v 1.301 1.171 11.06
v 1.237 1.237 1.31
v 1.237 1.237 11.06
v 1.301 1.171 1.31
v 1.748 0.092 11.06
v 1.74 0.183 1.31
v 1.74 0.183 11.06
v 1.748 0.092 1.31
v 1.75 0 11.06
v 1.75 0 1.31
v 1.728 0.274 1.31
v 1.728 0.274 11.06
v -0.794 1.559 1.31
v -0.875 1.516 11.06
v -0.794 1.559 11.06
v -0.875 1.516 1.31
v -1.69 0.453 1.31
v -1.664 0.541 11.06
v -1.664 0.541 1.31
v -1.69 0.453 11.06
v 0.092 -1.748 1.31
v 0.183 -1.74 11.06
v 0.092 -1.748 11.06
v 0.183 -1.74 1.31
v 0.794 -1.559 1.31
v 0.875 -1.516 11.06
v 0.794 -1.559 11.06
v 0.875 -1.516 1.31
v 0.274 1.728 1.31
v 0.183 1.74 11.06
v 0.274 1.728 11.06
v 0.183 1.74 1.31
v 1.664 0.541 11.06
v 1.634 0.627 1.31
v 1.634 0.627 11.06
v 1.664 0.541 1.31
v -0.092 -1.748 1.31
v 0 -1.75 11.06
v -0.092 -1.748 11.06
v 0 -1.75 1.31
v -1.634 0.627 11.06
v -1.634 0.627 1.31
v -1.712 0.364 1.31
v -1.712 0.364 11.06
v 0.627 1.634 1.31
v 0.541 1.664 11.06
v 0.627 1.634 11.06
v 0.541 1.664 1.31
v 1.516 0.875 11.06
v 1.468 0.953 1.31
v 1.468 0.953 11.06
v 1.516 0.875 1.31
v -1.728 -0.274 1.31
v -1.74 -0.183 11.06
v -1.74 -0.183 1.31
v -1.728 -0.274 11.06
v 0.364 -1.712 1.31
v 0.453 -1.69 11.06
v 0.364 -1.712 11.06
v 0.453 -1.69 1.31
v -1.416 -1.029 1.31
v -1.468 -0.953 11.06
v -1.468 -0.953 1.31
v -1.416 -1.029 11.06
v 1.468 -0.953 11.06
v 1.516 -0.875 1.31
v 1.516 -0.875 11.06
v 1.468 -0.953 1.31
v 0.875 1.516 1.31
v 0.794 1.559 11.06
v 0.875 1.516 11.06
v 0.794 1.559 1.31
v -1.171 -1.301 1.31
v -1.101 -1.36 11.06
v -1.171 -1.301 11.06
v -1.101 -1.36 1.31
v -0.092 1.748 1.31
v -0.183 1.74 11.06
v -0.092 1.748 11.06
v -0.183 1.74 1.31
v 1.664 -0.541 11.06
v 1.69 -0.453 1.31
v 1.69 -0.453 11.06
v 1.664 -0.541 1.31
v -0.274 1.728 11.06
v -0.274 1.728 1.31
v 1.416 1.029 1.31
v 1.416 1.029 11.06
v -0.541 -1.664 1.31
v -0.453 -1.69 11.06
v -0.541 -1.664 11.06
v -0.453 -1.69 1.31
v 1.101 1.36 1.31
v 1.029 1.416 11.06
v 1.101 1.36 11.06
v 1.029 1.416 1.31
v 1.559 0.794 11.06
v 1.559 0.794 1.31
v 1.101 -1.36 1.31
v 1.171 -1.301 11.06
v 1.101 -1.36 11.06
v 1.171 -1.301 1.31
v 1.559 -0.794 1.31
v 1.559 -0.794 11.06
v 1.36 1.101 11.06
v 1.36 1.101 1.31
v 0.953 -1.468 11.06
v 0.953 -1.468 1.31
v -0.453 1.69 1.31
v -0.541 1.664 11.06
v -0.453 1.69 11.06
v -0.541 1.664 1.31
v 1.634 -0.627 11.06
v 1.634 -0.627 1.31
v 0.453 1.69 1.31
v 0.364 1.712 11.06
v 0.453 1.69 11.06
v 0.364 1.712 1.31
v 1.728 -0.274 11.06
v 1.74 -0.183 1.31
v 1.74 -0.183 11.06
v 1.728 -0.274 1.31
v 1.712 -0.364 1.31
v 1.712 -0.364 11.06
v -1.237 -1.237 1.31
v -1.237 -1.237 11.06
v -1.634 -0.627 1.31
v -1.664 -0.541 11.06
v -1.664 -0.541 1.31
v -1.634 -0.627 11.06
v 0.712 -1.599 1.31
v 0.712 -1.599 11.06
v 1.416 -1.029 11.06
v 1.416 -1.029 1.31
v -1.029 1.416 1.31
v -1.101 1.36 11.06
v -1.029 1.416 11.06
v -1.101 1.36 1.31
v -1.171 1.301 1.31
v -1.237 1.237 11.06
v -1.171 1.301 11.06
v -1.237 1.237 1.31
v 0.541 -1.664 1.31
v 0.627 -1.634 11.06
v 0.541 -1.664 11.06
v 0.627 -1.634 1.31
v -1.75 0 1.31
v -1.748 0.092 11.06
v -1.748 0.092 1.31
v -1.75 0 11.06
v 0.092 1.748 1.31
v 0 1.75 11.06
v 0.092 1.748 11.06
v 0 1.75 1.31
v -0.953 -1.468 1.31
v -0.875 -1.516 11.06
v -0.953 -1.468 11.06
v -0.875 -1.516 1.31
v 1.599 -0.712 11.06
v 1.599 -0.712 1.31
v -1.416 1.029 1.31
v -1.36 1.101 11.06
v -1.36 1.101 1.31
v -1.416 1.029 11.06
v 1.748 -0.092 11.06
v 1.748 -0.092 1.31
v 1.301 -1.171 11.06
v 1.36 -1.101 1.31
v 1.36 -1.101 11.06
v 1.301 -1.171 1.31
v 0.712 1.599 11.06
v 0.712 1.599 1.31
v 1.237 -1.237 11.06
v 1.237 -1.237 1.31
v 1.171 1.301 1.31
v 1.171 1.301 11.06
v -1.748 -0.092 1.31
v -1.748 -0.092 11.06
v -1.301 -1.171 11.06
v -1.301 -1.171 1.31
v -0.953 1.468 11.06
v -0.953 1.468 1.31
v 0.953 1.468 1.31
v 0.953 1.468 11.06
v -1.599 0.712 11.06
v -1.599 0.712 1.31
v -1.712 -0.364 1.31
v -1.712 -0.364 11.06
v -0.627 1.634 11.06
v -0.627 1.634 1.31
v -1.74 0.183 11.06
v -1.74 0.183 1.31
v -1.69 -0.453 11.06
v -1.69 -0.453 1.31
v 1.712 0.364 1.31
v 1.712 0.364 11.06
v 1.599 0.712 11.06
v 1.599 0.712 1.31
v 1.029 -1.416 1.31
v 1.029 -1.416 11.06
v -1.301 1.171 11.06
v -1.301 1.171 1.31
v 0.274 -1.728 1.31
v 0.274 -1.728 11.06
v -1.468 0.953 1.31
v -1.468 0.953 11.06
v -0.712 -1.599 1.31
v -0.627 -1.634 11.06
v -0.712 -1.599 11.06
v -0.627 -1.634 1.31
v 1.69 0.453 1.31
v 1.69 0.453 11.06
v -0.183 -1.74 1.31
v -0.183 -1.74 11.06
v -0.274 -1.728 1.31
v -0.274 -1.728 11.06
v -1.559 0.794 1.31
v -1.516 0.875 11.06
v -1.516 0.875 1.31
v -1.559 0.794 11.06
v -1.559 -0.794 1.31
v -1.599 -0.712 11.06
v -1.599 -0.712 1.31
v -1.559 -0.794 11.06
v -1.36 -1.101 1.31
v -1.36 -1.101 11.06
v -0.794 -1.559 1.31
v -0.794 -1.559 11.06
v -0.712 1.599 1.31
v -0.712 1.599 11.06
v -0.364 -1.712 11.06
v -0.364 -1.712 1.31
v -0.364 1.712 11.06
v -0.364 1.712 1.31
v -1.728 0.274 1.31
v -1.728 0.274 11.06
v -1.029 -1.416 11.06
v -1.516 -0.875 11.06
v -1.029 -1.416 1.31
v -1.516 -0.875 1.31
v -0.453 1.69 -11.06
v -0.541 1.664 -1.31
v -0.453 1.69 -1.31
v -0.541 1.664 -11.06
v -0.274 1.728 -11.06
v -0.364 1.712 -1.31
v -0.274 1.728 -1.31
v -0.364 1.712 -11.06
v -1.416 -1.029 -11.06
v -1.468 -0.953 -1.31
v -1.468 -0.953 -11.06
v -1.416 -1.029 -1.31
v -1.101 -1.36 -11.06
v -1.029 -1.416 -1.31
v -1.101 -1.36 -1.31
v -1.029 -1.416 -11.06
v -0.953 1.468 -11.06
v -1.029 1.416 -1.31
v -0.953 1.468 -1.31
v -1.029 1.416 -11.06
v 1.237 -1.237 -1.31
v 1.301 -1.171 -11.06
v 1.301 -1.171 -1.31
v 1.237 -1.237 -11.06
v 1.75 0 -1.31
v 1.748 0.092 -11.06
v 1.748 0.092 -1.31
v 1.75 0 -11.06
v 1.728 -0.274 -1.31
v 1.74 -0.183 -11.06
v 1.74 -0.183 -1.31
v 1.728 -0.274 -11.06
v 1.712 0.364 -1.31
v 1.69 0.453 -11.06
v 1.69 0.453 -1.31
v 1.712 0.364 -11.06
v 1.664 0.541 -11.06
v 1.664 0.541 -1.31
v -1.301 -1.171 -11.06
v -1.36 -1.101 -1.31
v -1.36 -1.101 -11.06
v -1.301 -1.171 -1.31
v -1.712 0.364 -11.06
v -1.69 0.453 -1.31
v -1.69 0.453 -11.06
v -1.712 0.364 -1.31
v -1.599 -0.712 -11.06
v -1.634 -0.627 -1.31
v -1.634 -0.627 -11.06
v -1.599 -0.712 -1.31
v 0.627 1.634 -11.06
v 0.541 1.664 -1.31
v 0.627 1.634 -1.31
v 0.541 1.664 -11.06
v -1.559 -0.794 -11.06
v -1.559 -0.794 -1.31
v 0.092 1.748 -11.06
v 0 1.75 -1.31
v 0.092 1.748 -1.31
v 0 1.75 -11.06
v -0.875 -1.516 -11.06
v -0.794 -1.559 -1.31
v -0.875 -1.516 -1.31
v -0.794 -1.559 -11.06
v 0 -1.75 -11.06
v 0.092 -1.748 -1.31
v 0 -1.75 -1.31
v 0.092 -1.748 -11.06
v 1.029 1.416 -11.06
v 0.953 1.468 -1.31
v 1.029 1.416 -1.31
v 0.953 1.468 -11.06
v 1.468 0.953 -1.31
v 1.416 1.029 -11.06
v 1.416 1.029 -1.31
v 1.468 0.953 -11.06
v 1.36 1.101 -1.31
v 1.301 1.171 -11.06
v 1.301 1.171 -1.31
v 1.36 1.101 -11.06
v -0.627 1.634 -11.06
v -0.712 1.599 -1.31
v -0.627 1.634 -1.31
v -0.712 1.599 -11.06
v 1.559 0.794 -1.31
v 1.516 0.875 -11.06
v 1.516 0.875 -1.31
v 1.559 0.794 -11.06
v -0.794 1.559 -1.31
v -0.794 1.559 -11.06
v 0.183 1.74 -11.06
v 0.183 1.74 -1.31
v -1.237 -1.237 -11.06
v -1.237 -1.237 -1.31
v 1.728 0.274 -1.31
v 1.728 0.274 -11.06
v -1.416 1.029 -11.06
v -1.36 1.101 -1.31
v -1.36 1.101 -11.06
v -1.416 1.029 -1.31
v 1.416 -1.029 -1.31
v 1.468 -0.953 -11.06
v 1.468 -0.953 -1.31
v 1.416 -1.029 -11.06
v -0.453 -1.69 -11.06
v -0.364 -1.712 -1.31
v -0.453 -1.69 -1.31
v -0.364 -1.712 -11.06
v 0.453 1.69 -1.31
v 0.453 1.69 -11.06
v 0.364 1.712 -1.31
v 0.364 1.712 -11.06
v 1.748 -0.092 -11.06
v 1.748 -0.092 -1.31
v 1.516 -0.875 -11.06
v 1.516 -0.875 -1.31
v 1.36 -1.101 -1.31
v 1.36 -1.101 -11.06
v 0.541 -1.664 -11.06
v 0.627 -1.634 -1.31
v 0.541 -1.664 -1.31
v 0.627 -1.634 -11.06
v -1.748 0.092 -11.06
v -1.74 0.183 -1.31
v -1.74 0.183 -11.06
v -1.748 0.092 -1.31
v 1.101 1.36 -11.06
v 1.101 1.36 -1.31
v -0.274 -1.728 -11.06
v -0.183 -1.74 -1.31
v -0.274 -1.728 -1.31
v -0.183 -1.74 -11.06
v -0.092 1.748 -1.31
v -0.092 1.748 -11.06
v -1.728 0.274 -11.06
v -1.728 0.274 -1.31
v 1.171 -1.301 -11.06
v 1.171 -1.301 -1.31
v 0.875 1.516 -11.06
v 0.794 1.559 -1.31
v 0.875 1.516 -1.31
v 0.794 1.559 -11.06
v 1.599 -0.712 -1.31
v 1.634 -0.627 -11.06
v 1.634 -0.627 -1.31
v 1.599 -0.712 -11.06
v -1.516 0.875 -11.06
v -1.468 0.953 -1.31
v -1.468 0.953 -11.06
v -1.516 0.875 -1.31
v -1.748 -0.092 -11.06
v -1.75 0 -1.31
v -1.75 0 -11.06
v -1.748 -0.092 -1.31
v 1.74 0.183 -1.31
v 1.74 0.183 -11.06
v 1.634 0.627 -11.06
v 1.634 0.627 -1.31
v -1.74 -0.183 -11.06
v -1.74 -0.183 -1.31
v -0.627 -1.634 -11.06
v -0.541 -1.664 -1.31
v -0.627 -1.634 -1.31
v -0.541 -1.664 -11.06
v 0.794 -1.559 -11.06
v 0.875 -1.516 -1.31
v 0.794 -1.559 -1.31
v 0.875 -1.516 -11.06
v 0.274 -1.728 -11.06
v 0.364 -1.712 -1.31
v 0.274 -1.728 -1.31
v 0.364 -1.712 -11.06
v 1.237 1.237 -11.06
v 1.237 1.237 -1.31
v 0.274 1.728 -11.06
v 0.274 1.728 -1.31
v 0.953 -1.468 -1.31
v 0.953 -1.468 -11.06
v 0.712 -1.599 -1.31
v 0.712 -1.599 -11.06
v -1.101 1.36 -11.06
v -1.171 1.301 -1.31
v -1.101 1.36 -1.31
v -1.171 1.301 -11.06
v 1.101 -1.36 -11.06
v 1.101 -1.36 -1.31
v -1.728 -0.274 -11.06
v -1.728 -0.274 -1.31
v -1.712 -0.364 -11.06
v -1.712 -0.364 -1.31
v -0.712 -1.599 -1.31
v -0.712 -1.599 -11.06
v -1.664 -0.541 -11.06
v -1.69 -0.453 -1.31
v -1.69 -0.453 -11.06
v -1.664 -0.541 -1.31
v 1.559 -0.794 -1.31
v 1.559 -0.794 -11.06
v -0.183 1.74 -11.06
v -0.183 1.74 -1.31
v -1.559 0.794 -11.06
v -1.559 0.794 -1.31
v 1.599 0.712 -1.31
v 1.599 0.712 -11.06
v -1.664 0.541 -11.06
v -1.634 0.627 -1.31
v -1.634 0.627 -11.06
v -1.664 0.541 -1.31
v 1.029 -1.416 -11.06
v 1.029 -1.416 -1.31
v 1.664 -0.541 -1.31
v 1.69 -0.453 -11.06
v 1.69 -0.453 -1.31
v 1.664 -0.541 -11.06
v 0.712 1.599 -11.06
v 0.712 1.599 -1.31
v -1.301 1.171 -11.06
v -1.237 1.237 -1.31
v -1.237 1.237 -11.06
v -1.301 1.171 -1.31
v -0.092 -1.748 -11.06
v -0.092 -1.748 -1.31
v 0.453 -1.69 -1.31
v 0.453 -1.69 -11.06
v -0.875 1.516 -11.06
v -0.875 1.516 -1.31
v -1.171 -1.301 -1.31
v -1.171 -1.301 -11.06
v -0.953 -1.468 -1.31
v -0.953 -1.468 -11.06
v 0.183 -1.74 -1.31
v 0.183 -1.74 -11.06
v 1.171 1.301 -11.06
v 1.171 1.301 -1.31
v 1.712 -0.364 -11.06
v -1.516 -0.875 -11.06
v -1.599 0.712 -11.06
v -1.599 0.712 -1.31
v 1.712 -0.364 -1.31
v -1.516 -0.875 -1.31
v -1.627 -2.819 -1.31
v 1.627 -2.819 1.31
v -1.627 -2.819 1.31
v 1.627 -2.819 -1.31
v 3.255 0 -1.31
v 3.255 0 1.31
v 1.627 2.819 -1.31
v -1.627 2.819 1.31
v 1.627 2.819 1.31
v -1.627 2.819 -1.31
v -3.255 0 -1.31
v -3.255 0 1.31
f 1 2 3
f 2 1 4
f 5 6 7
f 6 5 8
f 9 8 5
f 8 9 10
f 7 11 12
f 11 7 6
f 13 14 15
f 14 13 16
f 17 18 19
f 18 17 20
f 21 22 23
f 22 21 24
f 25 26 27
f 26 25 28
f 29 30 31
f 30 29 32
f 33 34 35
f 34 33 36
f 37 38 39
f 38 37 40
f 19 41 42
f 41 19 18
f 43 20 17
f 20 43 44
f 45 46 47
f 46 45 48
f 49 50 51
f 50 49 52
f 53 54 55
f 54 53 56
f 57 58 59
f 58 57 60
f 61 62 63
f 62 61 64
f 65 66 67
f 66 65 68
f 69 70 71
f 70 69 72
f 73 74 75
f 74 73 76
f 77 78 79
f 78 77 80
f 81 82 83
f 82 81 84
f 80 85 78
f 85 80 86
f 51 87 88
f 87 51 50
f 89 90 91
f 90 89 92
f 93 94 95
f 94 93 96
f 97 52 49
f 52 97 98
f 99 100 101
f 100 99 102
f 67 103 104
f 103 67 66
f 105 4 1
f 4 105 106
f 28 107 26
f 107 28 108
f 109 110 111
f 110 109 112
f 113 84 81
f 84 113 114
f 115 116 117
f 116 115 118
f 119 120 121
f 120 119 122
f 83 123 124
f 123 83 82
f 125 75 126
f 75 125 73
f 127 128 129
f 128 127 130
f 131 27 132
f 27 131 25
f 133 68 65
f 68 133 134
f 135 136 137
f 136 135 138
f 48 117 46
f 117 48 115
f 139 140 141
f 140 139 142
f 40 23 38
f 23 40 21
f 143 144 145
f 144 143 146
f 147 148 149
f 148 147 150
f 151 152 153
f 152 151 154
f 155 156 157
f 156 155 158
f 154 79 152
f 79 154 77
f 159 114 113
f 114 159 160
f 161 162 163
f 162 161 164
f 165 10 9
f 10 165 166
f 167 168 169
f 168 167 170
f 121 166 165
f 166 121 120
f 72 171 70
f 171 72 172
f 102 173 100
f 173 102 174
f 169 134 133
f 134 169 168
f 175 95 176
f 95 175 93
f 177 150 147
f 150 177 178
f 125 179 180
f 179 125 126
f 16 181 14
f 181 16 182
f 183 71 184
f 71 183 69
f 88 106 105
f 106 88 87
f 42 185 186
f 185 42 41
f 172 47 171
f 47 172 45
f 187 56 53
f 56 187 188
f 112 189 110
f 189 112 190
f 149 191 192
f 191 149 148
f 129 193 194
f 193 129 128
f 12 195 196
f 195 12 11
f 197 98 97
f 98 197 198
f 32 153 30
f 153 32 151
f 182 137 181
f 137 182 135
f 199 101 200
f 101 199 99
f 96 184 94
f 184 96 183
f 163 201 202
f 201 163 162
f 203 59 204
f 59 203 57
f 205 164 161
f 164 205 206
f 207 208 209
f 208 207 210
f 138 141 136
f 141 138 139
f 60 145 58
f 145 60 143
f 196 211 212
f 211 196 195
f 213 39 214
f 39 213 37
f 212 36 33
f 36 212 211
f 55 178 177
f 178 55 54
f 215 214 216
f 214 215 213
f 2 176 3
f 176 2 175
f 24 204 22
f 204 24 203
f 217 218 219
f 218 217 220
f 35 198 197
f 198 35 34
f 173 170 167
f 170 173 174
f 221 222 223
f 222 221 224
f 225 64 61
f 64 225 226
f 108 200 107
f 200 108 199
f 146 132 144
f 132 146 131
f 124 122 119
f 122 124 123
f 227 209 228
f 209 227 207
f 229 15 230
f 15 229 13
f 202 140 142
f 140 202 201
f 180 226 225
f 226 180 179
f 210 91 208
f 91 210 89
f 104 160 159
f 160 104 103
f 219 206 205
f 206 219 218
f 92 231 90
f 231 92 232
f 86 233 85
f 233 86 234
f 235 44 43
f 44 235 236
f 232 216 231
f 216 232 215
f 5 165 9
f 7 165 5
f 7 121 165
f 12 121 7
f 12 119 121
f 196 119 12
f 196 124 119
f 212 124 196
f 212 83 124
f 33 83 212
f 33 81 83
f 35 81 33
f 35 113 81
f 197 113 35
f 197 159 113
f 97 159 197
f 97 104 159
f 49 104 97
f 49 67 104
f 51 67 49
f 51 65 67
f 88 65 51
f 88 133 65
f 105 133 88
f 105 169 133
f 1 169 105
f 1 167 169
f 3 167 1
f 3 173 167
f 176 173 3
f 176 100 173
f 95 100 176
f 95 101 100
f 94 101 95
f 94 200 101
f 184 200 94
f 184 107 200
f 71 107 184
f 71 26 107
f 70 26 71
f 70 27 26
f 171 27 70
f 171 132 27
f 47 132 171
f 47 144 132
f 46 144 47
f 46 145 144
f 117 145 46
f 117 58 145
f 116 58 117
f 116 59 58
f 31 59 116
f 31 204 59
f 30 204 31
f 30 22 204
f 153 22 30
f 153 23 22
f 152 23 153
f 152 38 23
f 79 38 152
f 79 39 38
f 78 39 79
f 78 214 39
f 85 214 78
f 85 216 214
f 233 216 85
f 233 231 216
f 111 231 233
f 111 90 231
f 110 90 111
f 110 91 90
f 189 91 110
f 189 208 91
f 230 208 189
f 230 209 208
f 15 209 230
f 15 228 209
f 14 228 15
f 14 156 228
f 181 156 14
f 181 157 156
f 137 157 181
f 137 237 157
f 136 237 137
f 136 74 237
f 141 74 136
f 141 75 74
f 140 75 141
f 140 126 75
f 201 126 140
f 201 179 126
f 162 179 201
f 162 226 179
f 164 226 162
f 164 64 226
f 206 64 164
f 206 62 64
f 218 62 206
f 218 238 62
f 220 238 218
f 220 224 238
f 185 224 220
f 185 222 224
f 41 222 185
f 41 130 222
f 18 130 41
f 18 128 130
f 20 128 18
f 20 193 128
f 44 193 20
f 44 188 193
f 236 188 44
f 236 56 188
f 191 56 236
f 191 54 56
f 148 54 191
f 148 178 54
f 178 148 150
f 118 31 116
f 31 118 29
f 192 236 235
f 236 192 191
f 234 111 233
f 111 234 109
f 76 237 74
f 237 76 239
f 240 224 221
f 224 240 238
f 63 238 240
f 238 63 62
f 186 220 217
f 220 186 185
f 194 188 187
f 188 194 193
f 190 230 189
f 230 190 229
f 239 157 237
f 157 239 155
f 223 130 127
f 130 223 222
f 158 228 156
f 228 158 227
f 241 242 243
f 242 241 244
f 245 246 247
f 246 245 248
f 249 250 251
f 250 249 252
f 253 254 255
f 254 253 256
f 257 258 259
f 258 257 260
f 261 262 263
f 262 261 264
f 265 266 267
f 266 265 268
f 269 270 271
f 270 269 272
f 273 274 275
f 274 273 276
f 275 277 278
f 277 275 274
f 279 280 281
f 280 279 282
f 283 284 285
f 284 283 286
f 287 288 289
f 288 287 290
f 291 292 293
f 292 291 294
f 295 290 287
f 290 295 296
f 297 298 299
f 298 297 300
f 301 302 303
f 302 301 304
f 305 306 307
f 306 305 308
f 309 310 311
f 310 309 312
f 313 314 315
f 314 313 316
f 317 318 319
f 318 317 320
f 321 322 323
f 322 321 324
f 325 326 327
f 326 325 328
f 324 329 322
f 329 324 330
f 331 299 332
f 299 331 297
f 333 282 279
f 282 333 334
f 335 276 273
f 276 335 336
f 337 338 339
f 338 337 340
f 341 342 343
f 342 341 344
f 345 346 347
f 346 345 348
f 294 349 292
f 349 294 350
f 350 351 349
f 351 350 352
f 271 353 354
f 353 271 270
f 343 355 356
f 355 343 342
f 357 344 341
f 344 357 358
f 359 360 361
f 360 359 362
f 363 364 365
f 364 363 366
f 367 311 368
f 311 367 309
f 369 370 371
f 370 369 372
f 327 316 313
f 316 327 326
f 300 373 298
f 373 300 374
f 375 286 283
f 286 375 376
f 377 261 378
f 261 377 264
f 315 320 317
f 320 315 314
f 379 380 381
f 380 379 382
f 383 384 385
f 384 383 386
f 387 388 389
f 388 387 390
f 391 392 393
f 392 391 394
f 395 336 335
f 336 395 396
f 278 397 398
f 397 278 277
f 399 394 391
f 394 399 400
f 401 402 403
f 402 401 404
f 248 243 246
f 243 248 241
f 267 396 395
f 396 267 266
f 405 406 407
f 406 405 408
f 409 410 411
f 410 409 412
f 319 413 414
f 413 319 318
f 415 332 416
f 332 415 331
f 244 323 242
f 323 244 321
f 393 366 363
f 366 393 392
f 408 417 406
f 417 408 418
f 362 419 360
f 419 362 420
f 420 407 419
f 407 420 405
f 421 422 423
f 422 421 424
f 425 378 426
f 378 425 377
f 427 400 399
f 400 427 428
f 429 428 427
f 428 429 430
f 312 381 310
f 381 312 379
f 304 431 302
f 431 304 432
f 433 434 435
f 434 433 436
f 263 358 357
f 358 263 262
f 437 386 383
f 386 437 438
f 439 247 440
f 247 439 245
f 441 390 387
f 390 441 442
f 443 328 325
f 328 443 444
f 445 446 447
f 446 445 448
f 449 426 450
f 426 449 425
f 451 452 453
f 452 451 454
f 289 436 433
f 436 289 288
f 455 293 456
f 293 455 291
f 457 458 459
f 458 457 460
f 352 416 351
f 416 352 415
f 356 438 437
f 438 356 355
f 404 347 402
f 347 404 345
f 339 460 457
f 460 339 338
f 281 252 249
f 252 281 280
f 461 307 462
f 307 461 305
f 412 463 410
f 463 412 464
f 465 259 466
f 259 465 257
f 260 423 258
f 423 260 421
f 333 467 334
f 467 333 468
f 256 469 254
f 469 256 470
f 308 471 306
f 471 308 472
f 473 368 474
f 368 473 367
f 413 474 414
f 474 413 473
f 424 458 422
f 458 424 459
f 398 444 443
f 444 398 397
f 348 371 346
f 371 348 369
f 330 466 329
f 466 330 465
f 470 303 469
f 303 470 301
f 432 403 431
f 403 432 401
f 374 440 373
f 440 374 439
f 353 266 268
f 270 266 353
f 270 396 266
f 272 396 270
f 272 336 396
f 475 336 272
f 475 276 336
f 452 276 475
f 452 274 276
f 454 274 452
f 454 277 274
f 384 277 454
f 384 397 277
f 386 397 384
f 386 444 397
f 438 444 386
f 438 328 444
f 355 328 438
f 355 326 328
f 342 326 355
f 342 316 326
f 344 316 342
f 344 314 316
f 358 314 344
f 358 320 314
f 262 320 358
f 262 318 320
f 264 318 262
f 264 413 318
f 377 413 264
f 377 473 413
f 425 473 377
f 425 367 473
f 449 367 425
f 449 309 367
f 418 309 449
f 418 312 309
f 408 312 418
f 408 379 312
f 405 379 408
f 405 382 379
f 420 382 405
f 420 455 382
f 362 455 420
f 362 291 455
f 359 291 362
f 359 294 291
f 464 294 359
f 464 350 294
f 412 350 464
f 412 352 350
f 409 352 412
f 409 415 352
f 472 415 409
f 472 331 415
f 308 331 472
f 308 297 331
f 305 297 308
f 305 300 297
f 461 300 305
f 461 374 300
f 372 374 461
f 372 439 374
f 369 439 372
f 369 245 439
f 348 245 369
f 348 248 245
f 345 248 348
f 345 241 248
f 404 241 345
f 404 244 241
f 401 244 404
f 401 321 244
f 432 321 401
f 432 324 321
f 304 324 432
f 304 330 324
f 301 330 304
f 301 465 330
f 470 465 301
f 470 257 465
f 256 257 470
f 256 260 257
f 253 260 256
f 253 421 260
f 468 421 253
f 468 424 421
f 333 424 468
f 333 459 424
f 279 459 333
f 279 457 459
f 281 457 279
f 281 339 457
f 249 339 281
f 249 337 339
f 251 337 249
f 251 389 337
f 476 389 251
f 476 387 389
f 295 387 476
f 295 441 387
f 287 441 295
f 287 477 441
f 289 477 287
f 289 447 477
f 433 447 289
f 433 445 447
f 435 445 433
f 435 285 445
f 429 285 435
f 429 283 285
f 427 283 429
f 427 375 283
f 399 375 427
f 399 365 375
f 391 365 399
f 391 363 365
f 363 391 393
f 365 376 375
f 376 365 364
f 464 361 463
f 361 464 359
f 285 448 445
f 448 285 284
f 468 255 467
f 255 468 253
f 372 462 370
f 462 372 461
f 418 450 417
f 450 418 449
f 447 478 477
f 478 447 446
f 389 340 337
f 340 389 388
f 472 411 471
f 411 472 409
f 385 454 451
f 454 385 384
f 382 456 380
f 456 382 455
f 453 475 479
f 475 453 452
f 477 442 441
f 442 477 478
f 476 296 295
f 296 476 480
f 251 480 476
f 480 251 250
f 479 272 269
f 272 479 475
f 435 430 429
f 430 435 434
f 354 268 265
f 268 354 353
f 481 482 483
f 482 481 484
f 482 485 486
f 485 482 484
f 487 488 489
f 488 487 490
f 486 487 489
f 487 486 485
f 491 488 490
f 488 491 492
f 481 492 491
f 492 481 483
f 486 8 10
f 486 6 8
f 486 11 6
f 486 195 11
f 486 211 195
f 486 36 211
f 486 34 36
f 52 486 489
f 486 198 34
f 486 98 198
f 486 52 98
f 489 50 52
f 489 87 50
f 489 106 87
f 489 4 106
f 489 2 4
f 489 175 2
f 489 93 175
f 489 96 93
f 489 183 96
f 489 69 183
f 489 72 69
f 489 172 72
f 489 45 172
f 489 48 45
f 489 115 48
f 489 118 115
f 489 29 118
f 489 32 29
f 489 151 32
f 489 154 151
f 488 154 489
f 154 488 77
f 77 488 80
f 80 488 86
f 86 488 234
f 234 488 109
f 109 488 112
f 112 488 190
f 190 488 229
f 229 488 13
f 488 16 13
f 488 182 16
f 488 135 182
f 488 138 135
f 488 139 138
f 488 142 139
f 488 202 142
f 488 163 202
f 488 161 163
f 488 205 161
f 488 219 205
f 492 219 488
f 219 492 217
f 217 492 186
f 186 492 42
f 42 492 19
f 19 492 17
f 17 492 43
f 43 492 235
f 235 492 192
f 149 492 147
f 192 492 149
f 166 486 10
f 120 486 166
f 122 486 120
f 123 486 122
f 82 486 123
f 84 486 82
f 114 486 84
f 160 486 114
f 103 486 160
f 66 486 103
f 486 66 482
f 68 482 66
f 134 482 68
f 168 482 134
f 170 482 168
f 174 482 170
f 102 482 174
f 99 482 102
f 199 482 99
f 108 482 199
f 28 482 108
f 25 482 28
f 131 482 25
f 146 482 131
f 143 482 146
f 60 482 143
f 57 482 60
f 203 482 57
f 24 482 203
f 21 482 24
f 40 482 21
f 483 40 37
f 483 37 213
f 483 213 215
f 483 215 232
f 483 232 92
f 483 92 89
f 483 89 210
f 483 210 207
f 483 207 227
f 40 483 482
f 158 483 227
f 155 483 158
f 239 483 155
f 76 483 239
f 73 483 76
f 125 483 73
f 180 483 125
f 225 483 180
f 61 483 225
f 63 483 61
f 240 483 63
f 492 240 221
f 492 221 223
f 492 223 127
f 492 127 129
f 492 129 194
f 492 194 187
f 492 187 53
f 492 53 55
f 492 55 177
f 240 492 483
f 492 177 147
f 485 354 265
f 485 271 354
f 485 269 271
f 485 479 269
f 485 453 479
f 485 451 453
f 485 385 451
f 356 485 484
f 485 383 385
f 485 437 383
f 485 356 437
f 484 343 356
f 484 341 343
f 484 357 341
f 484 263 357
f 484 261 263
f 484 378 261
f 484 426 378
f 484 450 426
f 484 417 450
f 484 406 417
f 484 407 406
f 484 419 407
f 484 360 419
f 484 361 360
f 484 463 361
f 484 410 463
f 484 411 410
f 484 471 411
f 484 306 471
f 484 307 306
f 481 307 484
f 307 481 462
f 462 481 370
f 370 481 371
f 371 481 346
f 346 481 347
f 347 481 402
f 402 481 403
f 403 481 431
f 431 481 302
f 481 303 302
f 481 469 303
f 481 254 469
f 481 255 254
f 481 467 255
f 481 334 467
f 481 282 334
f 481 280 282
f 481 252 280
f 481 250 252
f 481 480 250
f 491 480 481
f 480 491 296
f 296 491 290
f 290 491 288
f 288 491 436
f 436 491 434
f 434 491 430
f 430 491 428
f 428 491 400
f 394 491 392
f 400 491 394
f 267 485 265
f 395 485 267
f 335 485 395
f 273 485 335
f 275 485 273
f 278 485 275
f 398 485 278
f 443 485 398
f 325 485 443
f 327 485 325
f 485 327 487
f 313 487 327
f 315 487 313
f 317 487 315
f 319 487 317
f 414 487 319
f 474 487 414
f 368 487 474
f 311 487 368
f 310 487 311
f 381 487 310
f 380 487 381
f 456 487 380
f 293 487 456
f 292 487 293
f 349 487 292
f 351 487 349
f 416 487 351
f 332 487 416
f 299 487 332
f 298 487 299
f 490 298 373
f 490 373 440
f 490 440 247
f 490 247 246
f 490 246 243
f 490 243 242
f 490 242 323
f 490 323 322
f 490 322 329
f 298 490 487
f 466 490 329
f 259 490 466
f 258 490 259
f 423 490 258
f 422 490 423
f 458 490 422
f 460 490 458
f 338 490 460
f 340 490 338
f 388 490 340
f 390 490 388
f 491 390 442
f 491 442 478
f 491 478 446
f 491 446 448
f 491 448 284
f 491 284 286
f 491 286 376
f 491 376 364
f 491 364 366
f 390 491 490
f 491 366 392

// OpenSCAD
/////////////////////////////////////////////
//////////////// VARIABLES
/////////////////////////////////////////////

/////INTERNAL VARIABLES

/*
Diameter Sizes: 

    MUST BE DEFINED FIRST

[Diameter of bolt, 
    Diameter of nut = MAX,
    Depth of the nut - MAX]
*/

//ignore variable values
M3 = [3, 6.01, 2.12]*1;  //*1 is to hide the variables from Customizer
M4 = [4, 7.66, 2.92]*1; 
M5 = [5, 8.79, 3.65]*1; 
M6 = [6, 11.05, 4.15]*1; 
M7 = [7, 12.12, 4.95]*1;
M8 = [8, 14.38, 5.45]*1;
M10 = [10, 18.9, 6.56]*1;
M12 = [12, 21.1, 7.68]*1;
M14 = [14, 24.49, 8.98]*1;
M16 = [16, 26.75, 10.18]*1;
M18 = [18, 30.14, 11.72]*1;
M20 = [20, 33.53, 12.72]*1;
M22 = [22, 35.72, 14.22]*1;
M24 = [24, 39.98, 15.22]*1;
M27 = [27, 45.2, 17.35]*1;
M30 = [30, 50.85, 19.12]*1;
M33 = [33, 55.37, 21.42]*1;
M36 = [36, 60.79, 22.92]*1;
M39 = [39, 66.44, 25.43]*1;
M42 = [42, 71.3, 26.42]*1;
M45 = [45, 76.95, 28.42]*1;
M48 = [48, 82.60, 30.42]*1;

//FOR TESTING
exploded = 0*1;
res = 1*120;

////////////////////////EXTERNAL VARIABLES


//Metric Bolt Type
user_bolt_type = "M3"; //[M3, M4, M5, M6, M7, M8, M10, M12, M14, M16, M18, M20, M22, M24, M27, M30, M33, M36, M39, M42, M45, M48]

//Render the full bolt, just the head or a hex head with a bolt protuding from both ends:
show = "through"; //[full, through, head]

// Tolerance Adjustment in mm - increase to account for material shrinkage - 0.5 is a good start for ABS: 
tolerance = 0.5; //[0: 0.1: 2.0]

//Manually set bolt length in mm (over-rides the standard multiplier below): 
manual_bolt_length = 10;

//Length of bolt x bolt head size multiplier: 
bolt_length_multiplier = 2; //[0:0.5:10]

//Extra Hex Head depth in mm (over standard):
extra_head_depth = 0; //[0:0.25:50]


//Multiplier for through value:
bolt_length_through = bolt_length_multiplier * 2; //MUST follow other variables.




/////////////////////////////////////////////
//////////////// RENDERS
/////////////////////////////////////////////

bolt_type_if_statements();


/////////////////////////////////////////////
//////////////// MODULES
/////////////////////////////////////////////



//renders the final bolt dependant on what display variable is set
module final(h_l, h_s, b_s){
b_l = b_s * bolt_length_multiplier;
head(h_l, h_s);
if (show != "head"){

    if(show == "through"){

            bolt_blank(b_l, b_s, h_l);
            mirror([0,0,1]){
                bolt_blank(b_l, b_s, h_l);
                }
            }
            
    else {
        bolt_blank(b_l, b_s, h_l);
        }
}
}

//generates the bolt's HEX head
module head(h_l, h_s){

cylinder(h = h_l + tolerance + extra_head_depth, d = h_s + tolerance, center = true, $fn = 6);

}

//handles positioning of the blank dependant on whether a manual bolt length is selected or not, among other factors
module bolt_blank(b_l, b_s, h_l){
    
    if (manual_bolt_length != 0){
        translate([0,0,(h_l/2)+(manual_bolt_length/2)+exploded + (extra_head_depth/2)]){
    blank_a(manual_bolt_length, b_s);
    
        }
    }
    
    else {
    translate([0,0,(h_l/2)+(b_l/2)+exploded + (extra_head_depth/2)]){
    blank_a(b_l, b_s);
    }
    
    }
}

//Main blank for the circular bolt section
module blank_a(b_l, b_s){
    
        cylinder(h = b_l, d = b_s + tolerance, center = true, $fn = res);
}


//Handles the different bolt types that could be selected
module bolt_type_if_statements(){

if (user_bolt_type == "M3"){
final(M3[2], M3[1], M3[0]);
}

if (user_bolt_type == "M4"){
final(M4[2], M4[1], M4[0]);
}

if (user_bolt_type == "M5"){
final(M5[2], M5[1], M5[0]);
}

if (user_bolt_type == "M6"){
final(M6[2], M6[1], M6[0]);
}

if (user_bolt_type == "M7"){
final(M7[2], M7[1], M7[0]);
}

if (user_bolt_type == "M8"){
final(M8[2], M8[1], M8[0]);
}

if (user_bolt_type == "M10"){
final(M10[2], M10[1], M10[0]);
}

if (user_bolt_type == "M12"){
final(M12[2], M12[1], M12[0]);
}

if (user_bolt_type == "M14"){
final(M14[2], M14[1], M14[0]);
}

if (user_bolt_type == "M16"){
final(M16[2], M16[1], M16[0]);
}

if (user_bolt_type == "M18"){
final(M18[2], M18[1], M18[0]);
}

if (user_bolt_type == "M20"){
final(M20[2], M20[1], M20[0]);
}

if (user_bolt_type == "M22"){
final(M22[2], M22[1], M22[0]);
}

if (user_bolt_type == "M24"){
final(M24[2], M24[1], M24[0]);
}

if (user_bolt_type == "M27"){
final(M27[2], M27[1], M27[0]);
}

if (user_bolt_type == "M30"){
final(M30[2], M30[1], M30[0]);
}

if (user_bolt_type == "M33"){
final(M33[2], M33[1], M33[0]);
}

if (user_bolt_type == "M36"){
final(M36[2], M36[1], M36[0]);
}

if (user_bolt_type == "M39"){
final(M39[2], M39[1], M39[0]);
}

if (user_bolt_type == "M42"){
final(M42[2], M42[1], M42[0]);
}

if (user_bolt_type == "M45"){
final(M45[2], M45[1], M45[0]);
}

if (user_bolt_type == "M48"){
final(M48[2], M48[1], M48[0]);
}
}
